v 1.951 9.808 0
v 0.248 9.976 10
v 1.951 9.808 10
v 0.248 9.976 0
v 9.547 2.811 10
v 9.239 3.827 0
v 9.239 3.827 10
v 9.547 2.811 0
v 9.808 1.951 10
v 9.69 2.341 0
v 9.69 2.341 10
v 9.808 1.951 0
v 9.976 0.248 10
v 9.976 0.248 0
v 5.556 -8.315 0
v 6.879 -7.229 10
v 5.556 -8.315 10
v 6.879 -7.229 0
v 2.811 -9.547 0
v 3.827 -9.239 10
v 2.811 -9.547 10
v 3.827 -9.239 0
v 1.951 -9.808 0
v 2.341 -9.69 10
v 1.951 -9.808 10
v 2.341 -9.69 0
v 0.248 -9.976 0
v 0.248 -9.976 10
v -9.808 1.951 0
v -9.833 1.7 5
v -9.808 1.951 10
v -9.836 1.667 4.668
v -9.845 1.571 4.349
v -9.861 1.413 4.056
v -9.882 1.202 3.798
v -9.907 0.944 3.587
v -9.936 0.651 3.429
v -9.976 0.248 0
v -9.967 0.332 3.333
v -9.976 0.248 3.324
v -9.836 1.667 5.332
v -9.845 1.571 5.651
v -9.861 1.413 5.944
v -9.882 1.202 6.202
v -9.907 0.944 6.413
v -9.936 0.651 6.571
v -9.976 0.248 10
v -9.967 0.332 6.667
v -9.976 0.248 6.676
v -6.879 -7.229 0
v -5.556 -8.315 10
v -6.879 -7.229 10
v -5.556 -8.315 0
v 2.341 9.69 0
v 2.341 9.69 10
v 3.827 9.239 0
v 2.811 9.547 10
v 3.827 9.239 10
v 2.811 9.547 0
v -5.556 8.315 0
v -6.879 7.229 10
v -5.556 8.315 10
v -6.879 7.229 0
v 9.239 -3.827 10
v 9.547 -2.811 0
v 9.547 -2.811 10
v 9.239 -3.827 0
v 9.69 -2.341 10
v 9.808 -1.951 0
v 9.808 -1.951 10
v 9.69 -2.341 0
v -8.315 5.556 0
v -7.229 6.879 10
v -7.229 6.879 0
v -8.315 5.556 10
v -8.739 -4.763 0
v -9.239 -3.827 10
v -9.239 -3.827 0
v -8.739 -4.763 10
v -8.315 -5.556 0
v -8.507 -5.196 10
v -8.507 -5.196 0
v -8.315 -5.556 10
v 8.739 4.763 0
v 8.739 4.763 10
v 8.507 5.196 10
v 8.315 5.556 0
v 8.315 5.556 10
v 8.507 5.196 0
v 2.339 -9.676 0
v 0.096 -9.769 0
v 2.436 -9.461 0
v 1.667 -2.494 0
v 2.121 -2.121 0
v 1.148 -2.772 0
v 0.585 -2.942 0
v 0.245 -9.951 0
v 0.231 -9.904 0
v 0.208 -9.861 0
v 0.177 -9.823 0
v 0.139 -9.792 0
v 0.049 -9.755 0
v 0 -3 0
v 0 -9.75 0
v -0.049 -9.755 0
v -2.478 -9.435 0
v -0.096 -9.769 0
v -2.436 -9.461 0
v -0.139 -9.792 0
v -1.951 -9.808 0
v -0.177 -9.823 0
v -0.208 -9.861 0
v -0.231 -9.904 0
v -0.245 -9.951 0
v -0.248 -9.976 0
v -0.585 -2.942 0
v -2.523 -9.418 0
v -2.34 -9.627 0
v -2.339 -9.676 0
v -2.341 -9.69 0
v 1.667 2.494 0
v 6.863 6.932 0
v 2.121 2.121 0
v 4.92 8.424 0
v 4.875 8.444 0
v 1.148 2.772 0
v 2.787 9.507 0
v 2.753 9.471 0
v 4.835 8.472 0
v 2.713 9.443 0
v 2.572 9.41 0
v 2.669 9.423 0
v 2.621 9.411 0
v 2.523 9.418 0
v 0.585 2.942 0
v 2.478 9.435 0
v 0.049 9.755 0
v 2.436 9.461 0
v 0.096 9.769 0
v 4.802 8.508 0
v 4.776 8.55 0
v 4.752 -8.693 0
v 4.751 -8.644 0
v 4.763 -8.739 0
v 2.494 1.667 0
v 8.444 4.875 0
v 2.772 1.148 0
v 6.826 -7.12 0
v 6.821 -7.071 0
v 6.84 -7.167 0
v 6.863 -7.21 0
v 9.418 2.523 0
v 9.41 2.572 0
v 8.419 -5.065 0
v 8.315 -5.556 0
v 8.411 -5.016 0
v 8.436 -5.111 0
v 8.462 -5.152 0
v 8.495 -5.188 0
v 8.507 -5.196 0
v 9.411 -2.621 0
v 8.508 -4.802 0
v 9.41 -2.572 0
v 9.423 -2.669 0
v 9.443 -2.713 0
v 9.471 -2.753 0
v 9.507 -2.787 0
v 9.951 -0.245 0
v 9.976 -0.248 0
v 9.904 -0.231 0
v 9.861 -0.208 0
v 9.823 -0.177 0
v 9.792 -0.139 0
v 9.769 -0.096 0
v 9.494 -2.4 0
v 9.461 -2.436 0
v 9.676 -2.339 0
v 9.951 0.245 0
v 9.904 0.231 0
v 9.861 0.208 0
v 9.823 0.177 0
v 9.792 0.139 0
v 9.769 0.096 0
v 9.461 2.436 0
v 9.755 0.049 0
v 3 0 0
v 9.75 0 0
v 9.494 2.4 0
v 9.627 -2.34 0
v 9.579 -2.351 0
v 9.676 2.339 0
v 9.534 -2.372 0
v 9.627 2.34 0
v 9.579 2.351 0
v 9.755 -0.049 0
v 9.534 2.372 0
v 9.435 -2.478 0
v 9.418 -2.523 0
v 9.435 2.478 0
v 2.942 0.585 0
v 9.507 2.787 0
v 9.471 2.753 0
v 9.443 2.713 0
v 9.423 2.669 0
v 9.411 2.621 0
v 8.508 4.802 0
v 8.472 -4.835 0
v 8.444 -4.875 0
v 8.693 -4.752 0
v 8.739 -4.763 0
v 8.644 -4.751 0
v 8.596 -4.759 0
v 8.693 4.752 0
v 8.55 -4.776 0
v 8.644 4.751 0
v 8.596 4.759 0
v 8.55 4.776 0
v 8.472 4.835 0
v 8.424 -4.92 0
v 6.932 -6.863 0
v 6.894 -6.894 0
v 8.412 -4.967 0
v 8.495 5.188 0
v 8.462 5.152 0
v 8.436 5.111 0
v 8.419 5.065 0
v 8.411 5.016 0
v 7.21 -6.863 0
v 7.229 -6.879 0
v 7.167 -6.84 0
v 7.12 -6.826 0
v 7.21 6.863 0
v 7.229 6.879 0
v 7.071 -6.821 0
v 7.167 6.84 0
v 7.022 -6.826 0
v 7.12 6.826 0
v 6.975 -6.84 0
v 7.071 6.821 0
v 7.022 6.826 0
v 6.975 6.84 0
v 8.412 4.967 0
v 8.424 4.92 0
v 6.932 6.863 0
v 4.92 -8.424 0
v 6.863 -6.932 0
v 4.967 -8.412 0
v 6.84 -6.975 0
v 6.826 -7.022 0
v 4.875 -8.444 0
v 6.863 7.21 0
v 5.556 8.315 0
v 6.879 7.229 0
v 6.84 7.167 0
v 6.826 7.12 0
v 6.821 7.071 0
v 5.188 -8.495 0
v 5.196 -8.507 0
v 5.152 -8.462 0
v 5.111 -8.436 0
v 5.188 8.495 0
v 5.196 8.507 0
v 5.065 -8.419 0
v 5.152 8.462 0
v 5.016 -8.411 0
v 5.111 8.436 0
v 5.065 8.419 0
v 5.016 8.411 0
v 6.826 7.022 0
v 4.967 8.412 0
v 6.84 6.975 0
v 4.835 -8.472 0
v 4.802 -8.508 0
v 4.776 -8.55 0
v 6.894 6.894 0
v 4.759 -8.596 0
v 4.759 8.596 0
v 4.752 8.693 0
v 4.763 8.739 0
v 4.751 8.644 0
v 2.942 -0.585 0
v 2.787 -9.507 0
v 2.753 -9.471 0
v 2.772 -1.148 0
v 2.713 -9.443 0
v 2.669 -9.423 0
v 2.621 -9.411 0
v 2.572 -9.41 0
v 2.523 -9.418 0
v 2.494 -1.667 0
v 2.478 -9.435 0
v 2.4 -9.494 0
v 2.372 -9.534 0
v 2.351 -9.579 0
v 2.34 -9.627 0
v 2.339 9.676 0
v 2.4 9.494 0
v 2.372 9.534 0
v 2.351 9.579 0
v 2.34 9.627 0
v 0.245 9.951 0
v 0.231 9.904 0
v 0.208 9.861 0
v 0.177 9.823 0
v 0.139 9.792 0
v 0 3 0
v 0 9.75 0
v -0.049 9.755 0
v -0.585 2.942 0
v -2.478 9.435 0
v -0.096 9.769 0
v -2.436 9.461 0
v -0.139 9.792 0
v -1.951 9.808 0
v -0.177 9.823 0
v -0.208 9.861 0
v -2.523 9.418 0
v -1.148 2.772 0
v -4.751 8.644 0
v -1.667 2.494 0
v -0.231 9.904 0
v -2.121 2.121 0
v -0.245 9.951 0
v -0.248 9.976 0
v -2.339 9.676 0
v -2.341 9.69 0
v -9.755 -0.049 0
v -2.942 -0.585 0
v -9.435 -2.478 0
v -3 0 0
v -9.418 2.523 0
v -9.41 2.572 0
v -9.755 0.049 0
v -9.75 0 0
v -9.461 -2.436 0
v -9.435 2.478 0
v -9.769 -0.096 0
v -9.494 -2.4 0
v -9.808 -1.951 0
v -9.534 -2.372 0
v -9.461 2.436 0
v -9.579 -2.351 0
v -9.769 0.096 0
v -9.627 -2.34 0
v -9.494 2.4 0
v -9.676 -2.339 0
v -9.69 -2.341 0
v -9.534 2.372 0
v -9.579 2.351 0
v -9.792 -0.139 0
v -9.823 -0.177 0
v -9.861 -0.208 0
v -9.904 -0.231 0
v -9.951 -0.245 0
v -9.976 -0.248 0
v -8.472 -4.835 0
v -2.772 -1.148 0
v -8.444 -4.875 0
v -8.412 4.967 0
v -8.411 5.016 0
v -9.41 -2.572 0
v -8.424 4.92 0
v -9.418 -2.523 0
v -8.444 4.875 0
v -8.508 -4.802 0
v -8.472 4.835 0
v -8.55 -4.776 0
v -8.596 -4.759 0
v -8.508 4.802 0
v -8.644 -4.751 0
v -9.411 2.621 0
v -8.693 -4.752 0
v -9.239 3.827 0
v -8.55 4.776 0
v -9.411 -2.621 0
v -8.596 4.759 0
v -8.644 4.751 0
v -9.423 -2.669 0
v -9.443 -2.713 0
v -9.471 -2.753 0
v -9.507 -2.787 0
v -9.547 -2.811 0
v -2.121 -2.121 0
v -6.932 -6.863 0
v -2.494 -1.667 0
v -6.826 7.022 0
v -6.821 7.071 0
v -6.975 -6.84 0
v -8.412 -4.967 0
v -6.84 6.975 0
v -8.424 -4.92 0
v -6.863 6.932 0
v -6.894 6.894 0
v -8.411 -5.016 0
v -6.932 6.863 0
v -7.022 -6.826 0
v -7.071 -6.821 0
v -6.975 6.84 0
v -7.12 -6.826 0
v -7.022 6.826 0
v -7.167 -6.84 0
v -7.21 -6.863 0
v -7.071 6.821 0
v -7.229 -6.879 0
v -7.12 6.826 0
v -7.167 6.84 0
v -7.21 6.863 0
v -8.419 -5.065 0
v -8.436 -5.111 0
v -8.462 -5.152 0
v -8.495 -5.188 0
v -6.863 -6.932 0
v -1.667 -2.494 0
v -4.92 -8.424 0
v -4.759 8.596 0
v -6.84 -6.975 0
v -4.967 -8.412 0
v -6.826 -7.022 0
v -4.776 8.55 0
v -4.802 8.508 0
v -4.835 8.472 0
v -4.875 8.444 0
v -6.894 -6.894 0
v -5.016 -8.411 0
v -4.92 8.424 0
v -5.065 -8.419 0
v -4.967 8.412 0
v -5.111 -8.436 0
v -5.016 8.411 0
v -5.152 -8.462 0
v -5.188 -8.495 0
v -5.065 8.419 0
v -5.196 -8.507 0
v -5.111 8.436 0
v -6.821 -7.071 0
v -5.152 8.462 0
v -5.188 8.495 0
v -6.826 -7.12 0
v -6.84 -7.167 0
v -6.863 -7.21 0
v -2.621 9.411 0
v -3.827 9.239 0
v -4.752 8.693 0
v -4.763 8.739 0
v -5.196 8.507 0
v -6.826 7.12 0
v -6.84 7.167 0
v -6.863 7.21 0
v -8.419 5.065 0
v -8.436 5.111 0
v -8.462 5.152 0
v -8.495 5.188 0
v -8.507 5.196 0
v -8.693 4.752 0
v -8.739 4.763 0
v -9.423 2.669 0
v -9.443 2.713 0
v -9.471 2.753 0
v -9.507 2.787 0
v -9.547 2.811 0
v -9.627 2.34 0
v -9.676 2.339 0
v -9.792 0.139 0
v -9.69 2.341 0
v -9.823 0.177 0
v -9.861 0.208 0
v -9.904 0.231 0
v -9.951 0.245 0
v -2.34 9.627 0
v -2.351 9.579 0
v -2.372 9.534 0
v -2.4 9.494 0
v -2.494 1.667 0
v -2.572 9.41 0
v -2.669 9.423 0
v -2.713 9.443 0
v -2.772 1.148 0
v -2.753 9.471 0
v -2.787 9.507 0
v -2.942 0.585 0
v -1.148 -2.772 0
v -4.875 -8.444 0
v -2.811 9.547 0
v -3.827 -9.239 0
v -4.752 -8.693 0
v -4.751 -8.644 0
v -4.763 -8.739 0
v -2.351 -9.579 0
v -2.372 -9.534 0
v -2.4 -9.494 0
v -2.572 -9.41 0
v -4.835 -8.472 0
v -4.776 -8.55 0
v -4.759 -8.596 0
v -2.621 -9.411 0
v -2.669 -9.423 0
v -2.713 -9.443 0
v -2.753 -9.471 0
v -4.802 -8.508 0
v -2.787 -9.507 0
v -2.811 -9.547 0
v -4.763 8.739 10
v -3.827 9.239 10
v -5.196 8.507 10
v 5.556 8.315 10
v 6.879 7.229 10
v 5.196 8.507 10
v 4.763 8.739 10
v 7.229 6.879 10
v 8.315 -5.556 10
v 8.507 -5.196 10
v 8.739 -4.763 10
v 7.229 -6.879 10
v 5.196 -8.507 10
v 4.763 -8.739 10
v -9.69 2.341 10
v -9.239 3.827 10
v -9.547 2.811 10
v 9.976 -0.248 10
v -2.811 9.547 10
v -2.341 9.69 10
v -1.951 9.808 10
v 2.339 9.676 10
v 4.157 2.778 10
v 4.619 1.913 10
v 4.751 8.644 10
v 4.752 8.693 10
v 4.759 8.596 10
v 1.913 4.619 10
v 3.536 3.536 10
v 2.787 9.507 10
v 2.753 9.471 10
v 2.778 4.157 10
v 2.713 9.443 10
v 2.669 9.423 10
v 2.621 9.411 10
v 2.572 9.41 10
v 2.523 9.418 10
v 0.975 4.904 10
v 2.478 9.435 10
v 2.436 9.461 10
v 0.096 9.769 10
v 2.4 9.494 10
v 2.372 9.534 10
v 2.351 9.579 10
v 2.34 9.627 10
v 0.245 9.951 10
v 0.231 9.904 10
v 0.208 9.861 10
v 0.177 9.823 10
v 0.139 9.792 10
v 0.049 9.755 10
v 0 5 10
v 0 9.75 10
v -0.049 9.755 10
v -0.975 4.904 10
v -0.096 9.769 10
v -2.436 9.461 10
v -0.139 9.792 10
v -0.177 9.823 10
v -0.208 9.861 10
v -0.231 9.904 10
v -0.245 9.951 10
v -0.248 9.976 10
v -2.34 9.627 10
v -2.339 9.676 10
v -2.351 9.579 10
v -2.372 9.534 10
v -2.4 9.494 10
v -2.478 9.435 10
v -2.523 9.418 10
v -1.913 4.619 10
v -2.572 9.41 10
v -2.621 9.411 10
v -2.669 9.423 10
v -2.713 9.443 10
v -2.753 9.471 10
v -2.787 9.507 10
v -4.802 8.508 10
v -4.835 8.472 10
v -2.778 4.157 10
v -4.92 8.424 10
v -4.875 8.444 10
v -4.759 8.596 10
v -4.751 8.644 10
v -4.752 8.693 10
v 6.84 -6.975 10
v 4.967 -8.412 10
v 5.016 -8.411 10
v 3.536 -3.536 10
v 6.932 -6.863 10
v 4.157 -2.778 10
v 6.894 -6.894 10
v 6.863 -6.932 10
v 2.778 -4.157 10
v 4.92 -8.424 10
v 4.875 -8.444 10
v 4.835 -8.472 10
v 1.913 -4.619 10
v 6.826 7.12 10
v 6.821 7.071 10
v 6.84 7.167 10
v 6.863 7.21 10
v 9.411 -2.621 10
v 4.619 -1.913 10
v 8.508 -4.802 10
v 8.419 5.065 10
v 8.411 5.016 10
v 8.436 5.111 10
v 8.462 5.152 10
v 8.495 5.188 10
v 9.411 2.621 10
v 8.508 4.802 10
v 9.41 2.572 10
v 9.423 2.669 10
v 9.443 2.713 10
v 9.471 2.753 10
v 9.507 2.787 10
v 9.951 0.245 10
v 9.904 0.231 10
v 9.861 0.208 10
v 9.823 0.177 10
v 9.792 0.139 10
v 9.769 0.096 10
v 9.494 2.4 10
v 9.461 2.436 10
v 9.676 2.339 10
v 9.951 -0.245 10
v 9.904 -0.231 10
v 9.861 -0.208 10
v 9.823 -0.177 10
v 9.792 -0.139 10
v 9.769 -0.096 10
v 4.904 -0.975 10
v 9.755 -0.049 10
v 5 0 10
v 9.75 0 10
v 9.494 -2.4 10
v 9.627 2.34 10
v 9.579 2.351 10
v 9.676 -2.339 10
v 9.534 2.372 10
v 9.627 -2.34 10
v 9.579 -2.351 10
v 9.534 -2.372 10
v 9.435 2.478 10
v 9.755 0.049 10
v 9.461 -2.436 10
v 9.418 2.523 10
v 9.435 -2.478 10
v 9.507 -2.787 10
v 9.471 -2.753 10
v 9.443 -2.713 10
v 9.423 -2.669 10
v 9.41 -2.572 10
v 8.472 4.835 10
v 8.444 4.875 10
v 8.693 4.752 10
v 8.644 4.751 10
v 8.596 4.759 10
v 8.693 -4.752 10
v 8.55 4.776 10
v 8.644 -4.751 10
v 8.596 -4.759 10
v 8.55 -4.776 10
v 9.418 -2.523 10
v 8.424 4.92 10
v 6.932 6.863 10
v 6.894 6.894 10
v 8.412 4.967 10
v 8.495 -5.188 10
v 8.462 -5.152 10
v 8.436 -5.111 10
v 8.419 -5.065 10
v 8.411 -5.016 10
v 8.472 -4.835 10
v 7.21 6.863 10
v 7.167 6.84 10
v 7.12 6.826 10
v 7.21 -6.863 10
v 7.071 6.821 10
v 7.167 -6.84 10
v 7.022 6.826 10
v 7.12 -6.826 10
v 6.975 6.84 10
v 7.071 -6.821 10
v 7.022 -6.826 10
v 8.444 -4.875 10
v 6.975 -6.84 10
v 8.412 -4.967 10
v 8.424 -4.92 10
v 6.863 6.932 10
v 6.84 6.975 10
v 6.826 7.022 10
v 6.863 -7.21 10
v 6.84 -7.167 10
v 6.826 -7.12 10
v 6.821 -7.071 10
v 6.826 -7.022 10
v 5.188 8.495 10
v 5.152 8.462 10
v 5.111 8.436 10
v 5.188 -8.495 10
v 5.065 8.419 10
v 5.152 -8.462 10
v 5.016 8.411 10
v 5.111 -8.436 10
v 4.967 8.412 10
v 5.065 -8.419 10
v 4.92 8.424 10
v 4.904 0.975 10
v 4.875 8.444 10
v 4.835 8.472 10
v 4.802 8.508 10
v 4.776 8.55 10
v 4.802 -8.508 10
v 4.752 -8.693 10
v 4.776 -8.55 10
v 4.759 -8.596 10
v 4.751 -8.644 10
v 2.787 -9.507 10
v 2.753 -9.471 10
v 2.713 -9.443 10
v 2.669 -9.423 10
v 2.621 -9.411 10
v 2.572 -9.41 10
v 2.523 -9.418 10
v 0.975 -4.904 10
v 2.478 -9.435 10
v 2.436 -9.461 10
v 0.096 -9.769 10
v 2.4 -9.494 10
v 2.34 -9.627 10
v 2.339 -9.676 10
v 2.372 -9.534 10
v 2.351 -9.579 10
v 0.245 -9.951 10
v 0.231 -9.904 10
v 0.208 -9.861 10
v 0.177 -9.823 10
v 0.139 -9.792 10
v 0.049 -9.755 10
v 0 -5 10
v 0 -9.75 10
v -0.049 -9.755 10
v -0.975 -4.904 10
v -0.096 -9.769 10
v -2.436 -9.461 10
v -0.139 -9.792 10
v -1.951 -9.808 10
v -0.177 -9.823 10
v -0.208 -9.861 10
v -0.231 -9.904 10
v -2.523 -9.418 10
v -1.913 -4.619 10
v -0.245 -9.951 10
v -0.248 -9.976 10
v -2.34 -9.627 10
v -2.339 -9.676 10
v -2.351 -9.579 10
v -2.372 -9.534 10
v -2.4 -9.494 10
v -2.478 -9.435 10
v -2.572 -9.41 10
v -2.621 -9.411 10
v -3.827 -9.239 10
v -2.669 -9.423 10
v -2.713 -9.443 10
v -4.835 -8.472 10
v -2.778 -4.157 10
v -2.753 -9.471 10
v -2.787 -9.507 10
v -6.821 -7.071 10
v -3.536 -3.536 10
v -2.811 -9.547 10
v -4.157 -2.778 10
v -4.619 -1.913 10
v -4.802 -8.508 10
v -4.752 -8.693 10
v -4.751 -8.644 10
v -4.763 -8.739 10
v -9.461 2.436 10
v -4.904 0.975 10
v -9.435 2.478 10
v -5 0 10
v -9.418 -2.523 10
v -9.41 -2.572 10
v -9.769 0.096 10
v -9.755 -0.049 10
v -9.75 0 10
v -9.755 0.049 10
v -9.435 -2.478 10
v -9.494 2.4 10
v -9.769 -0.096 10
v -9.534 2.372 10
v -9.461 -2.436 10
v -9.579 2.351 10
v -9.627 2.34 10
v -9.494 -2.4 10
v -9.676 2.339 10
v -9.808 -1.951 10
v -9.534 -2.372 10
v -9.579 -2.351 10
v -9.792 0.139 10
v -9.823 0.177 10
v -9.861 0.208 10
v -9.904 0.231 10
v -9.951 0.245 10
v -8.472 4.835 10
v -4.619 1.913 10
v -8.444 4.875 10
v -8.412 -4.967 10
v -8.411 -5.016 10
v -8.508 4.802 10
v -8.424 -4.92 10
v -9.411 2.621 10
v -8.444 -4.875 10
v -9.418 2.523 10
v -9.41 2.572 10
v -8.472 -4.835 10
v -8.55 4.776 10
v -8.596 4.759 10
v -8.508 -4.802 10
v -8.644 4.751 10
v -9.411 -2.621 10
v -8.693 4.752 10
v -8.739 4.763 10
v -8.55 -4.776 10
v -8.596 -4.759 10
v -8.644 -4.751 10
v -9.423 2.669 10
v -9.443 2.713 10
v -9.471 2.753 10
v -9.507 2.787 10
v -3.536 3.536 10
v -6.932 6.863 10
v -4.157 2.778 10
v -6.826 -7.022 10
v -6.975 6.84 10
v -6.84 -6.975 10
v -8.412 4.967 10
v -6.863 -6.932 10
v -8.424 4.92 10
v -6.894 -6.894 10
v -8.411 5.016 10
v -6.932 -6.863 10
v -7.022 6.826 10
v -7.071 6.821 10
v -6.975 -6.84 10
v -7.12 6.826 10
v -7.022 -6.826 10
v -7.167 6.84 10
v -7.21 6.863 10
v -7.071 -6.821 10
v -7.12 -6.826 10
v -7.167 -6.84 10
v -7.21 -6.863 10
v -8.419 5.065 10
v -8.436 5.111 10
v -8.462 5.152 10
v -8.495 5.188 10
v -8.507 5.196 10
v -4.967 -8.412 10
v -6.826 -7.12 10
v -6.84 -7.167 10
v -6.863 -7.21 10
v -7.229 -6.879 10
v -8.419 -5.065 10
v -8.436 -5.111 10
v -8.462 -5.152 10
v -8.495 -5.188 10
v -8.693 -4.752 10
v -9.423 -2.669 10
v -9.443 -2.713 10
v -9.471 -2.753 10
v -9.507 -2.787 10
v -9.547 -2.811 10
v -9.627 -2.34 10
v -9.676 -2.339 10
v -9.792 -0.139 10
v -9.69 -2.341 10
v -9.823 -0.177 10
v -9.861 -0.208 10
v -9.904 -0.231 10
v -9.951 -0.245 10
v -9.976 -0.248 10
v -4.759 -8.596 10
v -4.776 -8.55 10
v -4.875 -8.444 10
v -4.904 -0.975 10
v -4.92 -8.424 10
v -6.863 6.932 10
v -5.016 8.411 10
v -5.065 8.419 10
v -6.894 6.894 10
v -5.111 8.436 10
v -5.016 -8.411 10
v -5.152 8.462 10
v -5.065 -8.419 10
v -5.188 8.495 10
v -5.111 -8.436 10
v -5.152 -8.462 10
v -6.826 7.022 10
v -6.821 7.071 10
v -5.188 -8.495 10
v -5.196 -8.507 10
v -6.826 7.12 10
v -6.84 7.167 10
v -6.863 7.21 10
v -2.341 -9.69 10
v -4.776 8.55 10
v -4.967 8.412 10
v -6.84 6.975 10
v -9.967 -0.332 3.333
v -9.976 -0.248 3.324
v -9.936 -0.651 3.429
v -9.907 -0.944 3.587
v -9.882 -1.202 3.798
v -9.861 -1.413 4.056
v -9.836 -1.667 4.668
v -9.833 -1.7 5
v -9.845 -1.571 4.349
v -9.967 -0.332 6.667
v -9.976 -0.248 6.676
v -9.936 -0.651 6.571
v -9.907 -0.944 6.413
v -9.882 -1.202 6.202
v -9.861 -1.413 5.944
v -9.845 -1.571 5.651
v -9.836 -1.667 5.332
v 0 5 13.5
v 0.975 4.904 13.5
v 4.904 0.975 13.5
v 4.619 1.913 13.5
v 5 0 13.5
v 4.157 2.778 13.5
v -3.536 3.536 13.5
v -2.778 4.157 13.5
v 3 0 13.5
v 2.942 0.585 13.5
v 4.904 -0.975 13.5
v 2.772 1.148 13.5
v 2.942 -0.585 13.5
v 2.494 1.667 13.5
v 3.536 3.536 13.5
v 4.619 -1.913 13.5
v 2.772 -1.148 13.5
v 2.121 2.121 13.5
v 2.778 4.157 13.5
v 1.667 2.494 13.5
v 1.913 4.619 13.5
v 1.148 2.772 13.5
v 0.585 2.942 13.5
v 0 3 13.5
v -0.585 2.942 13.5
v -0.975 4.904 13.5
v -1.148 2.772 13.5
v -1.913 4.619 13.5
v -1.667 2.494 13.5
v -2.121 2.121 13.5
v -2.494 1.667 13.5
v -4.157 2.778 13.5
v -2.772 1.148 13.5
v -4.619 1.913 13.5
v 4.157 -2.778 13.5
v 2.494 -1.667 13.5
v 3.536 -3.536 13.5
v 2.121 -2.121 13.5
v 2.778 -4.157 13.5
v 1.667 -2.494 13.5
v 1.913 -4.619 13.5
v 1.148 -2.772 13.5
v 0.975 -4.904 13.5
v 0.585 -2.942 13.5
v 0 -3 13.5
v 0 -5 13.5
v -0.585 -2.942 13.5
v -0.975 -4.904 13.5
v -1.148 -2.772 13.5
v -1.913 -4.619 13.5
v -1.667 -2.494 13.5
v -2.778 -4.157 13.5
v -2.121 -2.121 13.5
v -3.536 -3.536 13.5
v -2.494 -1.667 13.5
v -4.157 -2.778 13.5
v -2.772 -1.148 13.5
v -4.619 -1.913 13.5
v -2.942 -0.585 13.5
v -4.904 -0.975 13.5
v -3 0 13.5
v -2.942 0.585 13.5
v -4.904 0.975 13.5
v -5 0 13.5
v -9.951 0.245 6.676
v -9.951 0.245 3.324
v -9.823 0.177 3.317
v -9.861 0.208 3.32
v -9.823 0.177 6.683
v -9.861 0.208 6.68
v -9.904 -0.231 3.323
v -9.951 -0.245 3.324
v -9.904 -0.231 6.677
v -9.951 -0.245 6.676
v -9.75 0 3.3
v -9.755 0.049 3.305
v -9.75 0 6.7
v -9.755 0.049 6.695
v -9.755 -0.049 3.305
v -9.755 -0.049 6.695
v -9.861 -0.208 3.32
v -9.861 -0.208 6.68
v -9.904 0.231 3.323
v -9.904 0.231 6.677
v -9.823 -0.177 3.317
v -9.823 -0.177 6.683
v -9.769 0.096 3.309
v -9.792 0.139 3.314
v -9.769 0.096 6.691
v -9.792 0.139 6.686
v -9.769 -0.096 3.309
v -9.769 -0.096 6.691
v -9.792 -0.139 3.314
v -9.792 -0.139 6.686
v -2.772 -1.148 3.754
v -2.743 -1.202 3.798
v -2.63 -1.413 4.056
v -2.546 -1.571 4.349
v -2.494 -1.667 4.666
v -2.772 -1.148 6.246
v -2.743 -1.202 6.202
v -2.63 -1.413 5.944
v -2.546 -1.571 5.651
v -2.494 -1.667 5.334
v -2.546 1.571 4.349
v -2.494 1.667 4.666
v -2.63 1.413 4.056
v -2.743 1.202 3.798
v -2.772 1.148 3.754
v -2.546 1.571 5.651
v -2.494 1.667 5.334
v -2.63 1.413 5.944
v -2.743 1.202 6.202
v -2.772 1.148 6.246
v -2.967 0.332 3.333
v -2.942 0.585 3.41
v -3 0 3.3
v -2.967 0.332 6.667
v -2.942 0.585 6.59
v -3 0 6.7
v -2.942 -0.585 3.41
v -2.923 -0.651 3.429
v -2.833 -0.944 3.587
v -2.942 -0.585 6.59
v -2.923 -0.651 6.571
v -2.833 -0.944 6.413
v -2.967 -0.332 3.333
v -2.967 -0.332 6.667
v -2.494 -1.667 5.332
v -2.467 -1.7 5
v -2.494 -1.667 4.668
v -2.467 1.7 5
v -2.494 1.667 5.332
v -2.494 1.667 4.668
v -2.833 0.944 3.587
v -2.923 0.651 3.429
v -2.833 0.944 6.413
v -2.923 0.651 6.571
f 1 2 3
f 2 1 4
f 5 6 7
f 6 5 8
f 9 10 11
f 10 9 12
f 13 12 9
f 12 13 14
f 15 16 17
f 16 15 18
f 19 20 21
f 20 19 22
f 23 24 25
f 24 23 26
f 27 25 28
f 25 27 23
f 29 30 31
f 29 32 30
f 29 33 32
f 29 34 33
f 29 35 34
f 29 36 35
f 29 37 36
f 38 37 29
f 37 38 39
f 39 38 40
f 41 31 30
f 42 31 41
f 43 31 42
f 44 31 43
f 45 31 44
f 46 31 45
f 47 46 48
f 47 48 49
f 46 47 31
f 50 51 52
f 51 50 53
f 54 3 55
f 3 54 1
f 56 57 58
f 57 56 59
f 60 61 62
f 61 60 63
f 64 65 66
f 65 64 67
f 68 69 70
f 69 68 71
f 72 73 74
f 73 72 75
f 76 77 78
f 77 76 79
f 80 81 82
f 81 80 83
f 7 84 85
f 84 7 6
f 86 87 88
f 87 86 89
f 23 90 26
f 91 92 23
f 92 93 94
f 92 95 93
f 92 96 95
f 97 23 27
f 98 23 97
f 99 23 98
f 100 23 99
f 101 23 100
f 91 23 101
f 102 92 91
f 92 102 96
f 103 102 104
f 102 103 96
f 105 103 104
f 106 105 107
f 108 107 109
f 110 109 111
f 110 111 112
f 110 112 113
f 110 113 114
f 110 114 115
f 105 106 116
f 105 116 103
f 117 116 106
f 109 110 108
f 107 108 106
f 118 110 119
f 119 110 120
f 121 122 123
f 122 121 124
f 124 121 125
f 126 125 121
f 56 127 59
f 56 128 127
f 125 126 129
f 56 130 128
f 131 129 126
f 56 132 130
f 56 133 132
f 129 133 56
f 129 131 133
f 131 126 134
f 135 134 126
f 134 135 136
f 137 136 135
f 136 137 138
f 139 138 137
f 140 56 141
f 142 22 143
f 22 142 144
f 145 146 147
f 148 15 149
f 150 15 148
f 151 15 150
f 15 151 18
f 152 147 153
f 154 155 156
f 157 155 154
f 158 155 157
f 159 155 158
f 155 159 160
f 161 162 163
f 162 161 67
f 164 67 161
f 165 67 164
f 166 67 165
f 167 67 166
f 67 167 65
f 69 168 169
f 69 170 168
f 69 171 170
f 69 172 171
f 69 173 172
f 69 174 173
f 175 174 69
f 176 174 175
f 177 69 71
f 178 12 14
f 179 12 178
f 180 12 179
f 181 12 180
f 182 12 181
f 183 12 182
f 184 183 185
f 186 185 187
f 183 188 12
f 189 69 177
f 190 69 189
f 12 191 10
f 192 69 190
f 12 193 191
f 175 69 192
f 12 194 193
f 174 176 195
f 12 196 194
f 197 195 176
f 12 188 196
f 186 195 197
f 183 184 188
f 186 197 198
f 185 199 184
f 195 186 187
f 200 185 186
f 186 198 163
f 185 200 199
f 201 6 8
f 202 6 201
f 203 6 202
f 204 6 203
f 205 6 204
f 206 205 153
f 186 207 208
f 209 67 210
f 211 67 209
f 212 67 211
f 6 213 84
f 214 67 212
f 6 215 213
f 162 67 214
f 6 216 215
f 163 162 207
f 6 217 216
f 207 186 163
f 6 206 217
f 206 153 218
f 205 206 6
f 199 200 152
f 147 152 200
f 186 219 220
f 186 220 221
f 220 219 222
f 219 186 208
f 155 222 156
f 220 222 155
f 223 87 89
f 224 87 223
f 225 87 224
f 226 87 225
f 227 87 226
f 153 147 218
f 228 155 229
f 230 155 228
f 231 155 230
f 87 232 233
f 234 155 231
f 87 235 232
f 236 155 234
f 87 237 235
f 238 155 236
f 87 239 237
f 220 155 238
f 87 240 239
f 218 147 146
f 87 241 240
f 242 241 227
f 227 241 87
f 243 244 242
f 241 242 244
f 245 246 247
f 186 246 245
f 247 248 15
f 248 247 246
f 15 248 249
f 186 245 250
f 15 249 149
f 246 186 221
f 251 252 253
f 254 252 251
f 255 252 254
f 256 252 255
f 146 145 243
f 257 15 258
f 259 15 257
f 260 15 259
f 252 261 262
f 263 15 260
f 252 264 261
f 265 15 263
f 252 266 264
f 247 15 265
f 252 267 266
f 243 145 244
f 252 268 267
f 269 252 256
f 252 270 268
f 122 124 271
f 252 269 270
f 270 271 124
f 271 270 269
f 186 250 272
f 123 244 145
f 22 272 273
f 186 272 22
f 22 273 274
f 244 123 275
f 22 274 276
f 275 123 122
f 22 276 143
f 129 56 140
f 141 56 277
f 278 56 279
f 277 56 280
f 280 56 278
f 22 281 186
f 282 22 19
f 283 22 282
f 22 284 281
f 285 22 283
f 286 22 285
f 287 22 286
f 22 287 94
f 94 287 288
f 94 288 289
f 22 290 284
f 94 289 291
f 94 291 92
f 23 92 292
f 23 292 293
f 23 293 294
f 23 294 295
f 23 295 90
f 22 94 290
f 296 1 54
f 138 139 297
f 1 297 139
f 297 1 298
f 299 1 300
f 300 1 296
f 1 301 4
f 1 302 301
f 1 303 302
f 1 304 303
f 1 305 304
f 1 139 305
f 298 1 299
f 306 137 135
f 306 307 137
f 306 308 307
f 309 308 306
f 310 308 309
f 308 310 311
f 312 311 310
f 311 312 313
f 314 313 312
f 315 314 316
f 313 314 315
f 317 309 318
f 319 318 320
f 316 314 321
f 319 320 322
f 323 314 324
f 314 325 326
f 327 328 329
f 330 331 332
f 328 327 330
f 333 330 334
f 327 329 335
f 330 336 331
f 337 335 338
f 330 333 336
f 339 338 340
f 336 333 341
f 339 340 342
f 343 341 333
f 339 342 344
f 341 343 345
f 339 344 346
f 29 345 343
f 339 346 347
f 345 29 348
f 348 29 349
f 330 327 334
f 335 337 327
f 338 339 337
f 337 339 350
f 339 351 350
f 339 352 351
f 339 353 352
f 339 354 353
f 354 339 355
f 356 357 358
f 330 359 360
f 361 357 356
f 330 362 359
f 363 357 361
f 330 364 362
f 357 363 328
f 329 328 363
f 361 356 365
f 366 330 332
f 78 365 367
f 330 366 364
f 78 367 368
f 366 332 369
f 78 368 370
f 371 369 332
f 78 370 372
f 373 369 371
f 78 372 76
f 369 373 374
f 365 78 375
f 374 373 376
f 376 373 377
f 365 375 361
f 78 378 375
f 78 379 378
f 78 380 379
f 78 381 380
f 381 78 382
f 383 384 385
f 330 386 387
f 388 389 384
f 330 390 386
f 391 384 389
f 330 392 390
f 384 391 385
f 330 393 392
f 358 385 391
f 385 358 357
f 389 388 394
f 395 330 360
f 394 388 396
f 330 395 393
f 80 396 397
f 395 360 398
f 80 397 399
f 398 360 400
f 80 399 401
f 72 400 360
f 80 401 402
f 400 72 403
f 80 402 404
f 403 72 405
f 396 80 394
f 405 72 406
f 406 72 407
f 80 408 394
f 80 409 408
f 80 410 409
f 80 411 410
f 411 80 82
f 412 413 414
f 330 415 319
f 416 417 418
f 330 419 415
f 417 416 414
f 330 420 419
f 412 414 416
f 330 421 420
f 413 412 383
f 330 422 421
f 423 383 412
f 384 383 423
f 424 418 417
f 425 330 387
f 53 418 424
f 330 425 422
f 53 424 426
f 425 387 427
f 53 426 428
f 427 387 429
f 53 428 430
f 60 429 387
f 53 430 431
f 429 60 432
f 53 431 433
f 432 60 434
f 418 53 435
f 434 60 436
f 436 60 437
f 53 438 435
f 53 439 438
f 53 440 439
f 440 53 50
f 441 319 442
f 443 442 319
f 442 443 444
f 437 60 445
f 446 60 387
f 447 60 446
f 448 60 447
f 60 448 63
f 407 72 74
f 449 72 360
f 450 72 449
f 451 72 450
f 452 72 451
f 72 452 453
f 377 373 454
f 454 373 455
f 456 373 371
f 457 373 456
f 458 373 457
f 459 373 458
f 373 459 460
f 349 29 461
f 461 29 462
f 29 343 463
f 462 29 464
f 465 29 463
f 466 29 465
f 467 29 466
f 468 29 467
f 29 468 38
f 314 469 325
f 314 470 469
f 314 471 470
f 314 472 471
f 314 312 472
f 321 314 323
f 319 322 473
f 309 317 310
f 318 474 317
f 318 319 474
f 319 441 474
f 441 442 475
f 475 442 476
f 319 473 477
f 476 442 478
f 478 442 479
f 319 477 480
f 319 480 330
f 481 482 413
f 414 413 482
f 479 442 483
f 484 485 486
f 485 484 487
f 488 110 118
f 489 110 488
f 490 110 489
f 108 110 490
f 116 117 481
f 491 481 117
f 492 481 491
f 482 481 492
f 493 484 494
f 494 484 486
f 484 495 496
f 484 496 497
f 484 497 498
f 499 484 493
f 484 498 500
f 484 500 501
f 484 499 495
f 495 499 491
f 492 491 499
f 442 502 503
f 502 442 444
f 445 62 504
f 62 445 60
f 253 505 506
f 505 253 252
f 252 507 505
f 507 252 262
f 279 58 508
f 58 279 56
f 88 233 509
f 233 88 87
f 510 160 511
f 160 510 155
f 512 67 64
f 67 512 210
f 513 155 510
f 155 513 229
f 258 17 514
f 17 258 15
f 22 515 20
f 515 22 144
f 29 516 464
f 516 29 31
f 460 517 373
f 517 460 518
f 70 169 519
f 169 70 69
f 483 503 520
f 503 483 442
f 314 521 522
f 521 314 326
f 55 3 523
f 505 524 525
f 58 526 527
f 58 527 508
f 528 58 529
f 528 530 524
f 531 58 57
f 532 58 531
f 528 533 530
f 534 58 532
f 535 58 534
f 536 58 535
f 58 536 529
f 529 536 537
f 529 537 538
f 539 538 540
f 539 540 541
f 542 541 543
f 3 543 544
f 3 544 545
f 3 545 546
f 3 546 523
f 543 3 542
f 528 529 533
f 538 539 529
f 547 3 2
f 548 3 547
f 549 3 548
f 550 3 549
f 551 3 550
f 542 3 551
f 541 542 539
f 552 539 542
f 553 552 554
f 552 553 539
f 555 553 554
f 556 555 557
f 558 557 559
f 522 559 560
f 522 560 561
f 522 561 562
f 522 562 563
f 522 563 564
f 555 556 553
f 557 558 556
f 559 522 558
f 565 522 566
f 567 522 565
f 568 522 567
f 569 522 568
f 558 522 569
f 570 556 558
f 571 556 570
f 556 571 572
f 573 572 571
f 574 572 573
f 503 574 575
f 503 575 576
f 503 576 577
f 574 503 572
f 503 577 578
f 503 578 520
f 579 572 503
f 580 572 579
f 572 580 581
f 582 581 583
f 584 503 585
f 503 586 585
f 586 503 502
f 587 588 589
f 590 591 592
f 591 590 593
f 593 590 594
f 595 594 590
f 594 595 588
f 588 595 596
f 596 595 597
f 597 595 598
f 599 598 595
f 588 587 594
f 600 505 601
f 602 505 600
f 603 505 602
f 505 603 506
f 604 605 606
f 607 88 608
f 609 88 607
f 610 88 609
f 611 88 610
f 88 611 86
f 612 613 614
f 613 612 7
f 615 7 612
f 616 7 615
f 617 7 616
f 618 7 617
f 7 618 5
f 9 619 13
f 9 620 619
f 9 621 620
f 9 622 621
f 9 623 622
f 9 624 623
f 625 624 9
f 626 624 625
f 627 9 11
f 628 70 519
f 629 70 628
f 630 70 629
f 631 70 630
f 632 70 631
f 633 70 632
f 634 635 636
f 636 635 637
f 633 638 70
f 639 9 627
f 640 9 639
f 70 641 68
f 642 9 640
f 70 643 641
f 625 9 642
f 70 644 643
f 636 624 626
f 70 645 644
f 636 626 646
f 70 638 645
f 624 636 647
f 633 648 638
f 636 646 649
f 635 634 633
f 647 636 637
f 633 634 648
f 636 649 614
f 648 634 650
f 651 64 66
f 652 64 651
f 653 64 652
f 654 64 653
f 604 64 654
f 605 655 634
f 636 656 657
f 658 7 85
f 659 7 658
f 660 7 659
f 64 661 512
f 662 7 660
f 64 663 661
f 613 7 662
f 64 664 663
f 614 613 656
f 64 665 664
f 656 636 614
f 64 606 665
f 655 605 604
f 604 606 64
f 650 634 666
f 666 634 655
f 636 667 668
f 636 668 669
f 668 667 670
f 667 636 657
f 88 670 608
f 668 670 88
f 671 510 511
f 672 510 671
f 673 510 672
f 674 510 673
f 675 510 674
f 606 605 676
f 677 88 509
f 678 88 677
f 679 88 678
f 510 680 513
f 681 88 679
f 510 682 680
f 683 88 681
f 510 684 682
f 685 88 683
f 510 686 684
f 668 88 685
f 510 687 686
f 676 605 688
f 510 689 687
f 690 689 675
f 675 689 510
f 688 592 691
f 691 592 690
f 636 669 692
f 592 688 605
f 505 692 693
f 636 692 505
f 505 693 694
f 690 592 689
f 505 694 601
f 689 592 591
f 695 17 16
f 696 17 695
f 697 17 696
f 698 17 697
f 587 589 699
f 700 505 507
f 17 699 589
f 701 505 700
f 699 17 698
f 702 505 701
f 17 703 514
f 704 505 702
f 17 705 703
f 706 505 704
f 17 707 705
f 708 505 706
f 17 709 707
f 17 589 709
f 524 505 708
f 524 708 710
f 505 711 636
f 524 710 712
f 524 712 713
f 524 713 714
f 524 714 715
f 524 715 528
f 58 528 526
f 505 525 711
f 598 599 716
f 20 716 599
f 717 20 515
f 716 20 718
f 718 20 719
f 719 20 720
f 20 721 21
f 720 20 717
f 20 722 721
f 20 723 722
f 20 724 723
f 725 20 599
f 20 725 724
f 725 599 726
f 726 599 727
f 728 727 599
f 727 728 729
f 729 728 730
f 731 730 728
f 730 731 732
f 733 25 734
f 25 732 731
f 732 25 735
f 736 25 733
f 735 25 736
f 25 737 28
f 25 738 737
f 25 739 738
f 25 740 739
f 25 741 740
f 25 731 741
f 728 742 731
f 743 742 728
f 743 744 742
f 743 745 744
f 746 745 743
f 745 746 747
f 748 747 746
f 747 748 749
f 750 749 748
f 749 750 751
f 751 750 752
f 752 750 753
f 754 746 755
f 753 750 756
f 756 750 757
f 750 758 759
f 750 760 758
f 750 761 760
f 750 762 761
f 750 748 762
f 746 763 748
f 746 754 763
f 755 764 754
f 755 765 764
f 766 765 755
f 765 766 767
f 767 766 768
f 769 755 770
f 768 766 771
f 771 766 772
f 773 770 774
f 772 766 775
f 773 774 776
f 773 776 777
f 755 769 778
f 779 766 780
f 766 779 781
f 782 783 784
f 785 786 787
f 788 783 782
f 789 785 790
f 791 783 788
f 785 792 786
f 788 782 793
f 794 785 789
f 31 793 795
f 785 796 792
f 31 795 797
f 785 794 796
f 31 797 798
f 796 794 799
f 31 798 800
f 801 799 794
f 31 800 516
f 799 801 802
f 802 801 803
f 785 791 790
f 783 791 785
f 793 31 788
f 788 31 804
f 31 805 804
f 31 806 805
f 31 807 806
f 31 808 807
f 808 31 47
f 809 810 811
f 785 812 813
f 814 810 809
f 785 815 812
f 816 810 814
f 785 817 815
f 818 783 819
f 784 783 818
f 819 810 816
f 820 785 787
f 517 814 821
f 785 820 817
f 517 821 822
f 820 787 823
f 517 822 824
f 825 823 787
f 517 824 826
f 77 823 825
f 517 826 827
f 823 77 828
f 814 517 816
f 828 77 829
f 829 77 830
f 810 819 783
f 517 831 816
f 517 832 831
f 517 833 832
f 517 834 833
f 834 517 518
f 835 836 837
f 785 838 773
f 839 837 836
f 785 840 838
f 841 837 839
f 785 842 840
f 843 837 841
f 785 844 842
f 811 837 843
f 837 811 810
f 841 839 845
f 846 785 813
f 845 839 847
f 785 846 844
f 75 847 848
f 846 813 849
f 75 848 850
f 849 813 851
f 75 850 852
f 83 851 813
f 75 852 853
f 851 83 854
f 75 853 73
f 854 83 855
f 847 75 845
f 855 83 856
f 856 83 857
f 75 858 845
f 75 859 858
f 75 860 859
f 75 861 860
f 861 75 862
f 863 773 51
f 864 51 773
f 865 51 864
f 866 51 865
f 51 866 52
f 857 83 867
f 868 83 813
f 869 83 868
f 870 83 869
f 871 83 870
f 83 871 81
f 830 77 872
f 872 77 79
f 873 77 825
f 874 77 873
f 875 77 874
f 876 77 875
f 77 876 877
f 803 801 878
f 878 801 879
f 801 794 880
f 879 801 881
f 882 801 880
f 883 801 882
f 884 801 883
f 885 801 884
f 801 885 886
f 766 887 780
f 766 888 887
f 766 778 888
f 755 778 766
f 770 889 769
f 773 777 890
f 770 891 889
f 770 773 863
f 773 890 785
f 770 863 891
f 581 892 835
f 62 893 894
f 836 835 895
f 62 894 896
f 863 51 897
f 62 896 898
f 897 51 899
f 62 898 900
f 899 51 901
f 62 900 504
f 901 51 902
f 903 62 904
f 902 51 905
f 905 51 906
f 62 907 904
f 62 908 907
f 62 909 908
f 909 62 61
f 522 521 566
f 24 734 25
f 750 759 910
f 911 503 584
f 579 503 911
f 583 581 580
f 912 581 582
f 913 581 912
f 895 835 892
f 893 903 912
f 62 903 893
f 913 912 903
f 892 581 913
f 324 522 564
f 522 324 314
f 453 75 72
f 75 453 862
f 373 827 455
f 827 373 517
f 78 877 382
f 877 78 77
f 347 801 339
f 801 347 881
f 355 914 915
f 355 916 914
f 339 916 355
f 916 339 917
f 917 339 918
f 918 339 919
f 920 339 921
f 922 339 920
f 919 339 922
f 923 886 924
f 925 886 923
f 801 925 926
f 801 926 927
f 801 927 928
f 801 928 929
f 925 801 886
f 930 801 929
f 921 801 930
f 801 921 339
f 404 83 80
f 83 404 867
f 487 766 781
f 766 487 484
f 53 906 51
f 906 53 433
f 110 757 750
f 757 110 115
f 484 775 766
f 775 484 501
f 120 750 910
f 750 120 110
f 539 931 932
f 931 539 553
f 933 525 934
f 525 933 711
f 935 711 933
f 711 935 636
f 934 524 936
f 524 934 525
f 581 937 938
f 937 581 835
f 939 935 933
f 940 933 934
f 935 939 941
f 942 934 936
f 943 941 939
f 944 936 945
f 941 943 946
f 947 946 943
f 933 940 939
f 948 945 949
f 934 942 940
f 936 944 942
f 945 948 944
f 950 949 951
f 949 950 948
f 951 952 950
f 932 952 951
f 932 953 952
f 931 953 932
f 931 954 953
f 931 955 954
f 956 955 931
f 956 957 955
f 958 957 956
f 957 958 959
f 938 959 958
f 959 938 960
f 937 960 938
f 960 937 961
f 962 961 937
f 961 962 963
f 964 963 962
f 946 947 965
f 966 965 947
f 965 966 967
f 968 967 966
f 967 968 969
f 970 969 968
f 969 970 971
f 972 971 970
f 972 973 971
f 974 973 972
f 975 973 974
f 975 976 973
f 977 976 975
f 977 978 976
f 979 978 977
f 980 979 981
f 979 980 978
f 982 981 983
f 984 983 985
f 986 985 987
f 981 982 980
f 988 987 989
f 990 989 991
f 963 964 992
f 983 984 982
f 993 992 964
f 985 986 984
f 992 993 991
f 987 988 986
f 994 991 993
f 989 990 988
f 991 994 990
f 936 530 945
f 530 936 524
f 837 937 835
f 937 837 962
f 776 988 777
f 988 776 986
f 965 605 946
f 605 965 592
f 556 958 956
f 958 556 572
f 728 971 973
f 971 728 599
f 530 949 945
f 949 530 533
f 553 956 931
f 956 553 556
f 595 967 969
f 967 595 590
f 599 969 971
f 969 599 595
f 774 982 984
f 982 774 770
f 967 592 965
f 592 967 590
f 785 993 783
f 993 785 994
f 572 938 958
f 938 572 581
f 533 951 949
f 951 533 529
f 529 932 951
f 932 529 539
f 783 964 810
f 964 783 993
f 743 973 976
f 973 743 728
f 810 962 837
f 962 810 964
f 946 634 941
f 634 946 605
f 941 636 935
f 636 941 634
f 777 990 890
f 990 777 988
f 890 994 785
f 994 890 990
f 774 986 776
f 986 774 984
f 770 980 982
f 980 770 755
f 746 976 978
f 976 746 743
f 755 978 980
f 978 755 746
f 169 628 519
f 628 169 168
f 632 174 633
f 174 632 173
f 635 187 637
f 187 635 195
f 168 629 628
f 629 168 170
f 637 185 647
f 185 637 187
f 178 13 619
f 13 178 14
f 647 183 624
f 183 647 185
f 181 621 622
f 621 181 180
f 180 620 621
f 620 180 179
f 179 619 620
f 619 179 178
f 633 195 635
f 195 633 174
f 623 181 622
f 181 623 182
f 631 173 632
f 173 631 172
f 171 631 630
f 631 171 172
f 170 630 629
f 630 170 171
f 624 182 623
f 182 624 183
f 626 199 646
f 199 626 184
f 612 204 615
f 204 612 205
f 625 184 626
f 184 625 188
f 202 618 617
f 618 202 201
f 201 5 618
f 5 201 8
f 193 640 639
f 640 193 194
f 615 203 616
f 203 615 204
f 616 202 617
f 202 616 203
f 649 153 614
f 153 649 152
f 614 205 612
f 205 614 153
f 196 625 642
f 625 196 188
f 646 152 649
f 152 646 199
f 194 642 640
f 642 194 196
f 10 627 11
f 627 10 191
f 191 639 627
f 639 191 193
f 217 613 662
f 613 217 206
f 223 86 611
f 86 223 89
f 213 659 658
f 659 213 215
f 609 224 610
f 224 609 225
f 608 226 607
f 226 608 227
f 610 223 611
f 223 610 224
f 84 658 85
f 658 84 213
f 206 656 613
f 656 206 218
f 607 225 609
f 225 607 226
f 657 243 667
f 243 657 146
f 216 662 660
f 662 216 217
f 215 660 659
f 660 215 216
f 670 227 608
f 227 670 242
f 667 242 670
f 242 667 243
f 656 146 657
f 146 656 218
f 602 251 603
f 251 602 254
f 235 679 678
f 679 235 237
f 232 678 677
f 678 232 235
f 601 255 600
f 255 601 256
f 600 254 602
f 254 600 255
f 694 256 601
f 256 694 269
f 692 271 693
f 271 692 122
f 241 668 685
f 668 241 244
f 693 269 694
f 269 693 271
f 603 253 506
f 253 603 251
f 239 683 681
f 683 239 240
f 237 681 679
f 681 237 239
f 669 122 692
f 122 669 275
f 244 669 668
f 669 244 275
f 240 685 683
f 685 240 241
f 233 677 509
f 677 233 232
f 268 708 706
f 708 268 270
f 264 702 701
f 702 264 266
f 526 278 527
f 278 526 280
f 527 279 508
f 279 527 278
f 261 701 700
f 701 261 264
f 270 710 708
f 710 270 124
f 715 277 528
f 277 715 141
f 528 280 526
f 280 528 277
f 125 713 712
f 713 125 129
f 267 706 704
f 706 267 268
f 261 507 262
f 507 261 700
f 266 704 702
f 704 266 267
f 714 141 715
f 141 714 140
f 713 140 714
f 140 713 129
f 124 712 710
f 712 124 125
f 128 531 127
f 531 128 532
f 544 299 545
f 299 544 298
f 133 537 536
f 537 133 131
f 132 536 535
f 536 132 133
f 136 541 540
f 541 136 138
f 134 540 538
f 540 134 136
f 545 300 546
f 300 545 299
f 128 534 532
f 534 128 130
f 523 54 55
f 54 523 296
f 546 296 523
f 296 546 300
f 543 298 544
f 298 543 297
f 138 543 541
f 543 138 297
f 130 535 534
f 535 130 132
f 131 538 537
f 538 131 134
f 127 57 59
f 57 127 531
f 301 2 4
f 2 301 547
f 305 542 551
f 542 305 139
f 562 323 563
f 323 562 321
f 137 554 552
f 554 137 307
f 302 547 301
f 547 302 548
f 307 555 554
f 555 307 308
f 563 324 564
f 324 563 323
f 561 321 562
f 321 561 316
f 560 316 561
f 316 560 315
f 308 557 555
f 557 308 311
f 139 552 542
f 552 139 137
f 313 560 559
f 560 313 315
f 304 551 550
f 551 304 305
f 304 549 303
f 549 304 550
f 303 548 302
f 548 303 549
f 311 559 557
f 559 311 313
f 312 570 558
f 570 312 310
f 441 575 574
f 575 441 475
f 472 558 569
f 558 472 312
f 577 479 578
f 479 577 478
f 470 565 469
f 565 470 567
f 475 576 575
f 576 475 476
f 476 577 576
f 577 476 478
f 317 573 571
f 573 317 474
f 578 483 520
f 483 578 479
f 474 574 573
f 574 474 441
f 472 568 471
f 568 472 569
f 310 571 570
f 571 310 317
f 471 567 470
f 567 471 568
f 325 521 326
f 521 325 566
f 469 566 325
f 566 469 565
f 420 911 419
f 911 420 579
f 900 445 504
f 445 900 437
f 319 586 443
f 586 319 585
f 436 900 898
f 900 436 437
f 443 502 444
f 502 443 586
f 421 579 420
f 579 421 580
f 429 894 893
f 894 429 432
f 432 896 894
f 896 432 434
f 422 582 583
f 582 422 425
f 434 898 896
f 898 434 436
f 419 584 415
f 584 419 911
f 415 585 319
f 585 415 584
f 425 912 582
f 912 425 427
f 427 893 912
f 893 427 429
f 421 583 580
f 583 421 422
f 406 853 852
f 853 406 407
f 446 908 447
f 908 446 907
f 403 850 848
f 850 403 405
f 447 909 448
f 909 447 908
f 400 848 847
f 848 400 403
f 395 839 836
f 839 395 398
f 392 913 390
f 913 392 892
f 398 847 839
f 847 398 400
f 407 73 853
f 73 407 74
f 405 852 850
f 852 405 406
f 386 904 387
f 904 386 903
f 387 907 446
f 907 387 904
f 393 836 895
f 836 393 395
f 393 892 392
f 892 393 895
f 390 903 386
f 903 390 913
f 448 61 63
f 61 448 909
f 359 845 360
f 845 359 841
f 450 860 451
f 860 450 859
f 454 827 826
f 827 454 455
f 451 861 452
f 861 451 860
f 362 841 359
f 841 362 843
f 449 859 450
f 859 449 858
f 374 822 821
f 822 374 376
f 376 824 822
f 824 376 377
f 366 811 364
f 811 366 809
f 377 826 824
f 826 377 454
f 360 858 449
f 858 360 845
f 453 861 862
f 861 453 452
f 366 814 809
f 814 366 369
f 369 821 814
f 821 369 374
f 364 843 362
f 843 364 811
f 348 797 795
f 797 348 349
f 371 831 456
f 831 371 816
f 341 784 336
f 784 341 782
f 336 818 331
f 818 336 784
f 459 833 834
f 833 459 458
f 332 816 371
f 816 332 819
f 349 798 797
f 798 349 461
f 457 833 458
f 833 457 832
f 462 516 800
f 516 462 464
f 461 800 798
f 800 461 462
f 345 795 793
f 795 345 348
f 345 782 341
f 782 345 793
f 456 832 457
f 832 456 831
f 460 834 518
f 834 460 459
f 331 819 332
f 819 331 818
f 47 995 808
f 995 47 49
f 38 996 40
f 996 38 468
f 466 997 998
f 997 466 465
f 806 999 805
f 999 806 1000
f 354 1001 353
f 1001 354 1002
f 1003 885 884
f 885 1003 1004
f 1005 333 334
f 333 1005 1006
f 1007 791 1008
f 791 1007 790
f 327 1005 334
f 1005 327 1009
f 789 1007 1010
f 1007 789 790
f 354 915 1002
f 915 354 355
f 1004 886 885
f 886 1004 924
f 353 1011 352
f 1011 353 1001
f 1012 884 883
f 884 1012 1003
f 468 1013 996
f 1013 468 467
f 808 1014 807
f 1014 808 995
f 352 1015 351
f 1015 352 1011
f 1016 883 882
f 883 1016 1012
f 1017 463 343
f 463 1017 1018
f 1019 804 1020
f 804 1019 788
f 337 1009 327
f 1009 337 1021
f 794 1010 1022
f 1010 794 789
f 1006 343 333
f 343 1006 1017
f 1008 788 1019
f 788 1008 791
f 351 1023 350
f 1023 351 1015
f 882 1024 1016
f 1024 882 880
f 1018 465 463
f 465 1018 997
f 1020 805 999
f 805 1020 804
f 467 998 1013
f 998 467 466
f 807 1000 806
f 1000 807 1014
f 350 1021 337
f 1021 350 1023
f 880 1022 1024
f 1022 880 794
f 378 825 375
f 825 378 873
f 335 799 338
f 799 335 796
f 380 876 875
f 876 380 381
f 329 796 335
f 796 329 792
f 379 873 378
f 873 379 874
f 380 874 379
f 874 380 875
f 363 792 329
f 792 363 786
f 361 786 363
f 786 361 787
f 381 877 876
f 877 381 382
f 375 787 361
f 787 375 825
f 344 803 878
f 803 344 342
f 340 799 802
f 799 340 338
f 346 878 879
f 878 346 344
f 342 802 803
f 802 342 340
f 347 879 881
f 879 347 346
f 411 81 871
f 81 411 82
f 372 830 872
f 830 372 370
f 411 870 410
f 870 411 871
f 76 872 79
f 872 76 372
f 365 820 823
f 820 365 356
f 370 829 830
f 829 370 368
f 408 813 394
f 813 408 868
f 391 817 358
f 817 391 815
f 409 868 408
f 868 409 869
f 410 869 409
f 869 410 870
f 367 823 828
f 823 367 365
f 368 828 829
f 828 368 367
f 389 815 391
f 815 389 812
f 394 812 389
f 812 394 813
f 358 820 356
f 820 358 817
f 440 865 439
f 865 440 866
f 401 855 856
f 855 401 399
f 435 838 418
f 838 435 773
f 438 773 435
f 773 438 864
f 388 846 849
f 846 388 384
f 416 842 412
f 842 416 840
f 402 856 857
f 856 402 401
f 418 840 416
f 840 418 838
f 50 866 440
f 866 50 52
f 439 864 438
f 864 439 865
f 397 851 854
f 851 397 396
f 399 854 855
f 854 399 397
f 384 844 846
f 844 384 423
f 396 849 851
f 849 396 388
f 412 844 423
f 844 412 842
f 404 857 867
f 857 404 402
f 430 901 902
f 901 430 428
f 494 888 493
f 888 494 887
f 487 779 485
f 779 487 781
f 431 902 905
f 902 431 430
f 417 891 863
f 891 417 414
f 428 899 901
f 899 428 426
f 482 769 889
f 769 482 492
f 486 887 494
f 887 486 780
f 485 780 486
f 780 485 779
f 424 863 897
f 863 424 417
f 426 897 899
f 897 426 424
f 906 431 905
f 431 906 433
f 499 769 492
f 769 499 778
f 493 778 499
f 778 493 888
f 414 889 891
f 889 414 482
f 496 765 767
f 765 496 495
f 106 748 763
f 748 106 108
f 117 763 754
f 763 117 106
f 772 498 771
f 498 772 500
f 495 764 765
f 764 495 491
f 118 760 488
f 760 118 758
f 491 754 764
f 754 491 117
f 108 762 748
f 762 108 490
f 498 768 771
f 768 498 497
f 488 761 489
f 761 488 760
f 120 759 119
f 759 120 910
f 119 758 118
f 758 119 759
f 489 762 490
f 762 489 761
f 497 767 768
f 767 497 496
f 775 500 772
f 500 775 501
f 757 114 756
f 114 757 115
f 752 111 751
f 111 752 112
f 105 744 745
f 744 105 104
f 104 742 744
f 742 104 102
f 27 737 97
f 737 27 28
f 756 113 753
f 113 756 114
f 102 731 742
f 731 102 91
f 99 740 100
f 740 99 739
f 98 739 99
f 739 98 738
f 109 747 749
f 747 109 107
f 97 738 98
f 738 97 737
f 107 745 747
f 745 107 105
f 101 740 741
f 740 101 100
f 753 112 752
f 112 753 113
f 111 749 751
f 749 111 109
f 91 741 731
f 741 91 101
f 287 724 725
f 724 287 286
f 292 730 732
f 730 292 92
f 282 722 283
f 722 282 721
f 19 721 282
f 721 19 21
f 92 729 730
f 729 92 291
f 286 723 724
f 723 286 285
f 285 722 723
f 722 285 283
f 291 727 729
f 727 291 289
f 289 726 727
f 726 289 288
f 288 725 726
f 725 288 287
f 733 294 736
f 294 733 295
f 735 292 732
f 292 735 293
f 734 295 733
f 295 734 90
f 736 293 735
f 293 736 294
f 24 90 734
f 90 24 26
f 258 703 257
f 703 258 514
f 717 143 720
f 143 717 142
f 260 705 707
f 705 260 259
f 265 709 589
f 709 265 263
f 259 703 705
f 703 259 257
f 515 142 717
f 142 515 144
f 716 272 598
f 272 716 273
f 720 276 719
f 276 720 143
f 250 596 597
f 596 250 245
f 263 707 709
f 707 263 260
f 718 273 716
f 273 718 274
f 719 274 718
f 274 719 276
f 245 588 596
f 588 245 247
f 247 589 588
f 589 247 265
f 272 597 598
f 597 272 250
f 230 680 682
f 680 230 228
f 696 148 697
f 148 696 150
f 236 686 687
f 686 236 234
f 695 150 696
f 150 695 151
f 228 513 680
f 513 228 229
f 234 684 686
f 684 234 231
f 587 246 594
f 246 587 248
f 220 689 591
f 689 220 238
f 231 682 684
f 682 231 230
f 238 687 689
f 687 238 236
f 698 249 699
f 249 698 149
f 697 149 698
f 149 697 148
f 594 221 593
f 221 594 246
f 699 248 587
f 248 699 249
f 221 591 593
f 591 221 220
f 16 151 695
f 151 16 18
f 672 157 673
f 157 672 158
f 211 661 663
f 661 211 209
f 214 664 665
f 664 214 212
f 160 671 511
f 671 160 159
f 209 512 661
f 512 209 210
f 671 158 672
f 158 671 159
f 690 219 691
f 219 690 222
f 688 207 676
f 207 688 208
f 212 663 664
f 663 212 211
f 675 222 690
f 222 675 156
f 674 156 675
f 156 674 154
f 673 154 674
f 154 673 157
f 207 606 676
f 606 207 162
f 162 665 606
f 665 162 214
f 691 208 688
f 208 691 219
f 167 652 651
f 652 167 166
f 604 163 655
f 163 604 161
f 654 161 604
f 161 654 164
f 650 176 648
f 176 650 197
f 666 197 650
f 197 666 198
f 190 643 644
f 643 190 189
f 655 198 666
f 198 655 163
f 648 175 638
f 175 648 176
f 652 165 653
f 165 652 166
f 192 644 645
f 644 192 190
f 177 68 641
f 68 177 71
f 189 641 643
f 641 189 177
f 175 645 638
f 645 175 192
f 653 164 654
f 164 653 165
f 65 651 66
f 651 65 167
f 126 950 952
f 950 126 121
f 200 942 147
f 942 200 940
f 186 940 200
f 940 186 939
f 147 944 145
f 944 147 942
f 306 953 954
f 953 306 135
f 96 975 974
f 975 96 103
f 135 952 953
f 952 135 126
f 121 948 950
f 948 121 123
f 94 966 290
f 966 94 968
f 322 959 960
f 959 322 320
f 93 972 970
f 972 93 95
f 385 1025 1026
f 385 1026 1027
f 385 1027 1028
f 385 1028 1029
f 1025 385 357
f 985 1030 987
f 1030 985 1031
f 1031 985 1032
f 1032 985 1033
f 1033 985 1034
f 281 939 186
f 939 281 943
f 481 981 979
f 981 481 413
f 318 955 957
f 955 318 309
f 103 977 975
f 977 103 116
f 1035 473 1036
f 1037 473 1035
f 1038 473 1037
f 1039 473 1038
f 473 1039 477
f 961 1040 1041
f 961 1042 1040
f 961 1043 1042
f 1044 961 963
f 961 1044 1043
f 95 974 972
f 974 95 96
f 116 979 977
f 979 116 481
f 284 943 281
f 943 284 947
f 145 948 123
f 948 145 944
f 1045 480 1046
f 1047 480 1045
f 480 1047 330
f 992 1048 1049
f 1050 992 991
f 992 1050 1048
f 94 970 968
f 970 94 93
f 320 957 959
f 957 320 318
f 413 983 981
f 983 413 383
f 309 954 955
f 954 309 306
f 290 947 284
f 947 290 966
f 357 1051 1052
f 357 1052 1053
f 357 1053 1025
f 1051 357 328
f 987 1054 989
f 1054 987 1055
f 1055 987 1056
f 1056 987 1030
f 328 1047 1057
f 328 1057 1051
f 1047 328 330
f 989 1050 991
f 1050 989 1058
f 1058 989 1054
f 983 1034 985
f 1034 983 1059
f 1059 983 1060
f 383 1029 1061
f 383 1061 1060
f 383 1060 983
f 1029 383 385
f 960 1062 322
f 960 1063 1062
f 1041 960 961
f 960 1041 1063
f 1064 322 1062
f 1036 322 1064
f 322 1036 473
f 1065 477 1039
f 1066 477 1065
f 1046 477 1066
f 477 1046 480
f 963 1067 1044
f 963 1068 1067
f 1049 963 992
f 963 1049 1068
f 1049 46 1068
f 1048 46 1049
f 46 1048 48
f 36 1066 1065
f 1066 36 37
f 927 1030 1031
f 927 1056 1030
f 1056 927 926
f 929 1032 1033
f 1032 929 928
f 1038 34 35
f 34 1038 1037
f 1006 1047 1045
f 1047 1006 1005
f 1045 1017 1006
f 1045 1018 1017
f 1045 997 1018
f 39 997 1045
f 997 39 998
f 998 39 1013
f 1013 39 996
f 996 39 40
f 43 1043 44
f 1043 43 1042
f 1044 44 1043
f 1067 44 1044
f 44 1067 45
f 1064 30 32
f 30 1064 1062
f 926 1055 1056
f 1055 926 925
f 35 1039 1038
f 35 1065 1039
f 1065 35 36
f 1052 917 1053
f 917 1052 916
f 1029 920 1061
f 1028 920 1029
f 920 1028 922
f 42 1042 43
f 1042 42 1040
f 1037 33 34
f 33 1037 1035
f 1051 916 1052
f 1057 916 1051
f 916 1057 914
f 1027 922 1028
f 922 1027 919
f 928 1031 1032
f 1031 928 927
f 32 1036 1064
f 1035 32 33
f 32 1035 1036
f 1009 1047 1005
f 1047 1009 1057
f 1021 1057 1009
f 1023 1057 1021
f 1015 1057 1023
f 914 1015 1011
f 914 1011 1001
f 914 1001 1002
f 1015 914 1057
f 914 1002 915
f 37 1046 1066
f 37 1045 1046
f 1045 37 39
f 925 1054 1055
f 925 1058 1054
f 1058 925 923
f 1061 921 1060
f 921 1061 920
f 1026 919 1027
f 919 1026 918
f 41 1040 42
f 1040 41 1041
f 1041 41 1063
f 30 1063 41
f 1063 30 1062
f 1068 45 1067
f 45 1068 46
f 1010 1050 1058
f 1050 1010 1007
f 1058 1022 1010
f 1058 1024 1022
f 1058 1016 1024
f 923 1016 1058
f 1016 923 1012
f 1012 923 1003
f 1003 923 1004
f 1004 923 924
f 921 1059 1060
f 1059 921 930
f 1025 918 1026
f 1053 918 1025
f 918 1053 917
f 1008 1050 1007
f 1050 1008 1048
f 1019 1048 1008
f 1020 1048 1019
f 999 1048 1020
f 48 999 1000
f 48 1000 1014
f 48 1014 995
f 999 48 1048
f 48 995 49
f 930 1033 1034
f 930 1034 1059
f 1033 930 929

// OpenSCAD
$fn = 32;

// ----------------------------------------------------------------------
// Hand knob: 20 x 20 x 13.5 mm
// ----------------------------------------------------------------------

// --- parameters (mm) ---
head_d = 20;              // knob diameter
head_h = 10;              // knob height
hole_d = 6;               // shaft bore
set_d = 3.4;              // set screw tap hole
notch_d = 0.5;            // knurl groove diameter
knurl_n = 24;             // number of knurl grooves
cap_h = 3.5;              // raised centre cap
cap_d = 10;               // centre cap diameter

module body() {
  cylinder(h = head_h, d = head_d);
}

module cap() {
  translate([0, 0, head_h - 1]) cylinder(h = cap_h + 1, d = cap_d);
}

difference() {
  union() {
    body();
    cap();
  }
  translate([0, 0, -1]) cylinder(h = head_h + cap_h + 2, d = hole_d);
  /* knurl grooves */
  for (i = [0 : knurl_n - 1])
    rotate([0, 0, i * 360 / knurl_n])
      translate([head_d / 2, 0, -0.5])
        cylinder(h = head_h + 1, d = notch_d);
  translate([-head_d / 2 - 1, 0, head_h * 0.5]) rotate([0, 90, 0]) cylinder(h = head_d / 2 + 2, d = set_d);
}
